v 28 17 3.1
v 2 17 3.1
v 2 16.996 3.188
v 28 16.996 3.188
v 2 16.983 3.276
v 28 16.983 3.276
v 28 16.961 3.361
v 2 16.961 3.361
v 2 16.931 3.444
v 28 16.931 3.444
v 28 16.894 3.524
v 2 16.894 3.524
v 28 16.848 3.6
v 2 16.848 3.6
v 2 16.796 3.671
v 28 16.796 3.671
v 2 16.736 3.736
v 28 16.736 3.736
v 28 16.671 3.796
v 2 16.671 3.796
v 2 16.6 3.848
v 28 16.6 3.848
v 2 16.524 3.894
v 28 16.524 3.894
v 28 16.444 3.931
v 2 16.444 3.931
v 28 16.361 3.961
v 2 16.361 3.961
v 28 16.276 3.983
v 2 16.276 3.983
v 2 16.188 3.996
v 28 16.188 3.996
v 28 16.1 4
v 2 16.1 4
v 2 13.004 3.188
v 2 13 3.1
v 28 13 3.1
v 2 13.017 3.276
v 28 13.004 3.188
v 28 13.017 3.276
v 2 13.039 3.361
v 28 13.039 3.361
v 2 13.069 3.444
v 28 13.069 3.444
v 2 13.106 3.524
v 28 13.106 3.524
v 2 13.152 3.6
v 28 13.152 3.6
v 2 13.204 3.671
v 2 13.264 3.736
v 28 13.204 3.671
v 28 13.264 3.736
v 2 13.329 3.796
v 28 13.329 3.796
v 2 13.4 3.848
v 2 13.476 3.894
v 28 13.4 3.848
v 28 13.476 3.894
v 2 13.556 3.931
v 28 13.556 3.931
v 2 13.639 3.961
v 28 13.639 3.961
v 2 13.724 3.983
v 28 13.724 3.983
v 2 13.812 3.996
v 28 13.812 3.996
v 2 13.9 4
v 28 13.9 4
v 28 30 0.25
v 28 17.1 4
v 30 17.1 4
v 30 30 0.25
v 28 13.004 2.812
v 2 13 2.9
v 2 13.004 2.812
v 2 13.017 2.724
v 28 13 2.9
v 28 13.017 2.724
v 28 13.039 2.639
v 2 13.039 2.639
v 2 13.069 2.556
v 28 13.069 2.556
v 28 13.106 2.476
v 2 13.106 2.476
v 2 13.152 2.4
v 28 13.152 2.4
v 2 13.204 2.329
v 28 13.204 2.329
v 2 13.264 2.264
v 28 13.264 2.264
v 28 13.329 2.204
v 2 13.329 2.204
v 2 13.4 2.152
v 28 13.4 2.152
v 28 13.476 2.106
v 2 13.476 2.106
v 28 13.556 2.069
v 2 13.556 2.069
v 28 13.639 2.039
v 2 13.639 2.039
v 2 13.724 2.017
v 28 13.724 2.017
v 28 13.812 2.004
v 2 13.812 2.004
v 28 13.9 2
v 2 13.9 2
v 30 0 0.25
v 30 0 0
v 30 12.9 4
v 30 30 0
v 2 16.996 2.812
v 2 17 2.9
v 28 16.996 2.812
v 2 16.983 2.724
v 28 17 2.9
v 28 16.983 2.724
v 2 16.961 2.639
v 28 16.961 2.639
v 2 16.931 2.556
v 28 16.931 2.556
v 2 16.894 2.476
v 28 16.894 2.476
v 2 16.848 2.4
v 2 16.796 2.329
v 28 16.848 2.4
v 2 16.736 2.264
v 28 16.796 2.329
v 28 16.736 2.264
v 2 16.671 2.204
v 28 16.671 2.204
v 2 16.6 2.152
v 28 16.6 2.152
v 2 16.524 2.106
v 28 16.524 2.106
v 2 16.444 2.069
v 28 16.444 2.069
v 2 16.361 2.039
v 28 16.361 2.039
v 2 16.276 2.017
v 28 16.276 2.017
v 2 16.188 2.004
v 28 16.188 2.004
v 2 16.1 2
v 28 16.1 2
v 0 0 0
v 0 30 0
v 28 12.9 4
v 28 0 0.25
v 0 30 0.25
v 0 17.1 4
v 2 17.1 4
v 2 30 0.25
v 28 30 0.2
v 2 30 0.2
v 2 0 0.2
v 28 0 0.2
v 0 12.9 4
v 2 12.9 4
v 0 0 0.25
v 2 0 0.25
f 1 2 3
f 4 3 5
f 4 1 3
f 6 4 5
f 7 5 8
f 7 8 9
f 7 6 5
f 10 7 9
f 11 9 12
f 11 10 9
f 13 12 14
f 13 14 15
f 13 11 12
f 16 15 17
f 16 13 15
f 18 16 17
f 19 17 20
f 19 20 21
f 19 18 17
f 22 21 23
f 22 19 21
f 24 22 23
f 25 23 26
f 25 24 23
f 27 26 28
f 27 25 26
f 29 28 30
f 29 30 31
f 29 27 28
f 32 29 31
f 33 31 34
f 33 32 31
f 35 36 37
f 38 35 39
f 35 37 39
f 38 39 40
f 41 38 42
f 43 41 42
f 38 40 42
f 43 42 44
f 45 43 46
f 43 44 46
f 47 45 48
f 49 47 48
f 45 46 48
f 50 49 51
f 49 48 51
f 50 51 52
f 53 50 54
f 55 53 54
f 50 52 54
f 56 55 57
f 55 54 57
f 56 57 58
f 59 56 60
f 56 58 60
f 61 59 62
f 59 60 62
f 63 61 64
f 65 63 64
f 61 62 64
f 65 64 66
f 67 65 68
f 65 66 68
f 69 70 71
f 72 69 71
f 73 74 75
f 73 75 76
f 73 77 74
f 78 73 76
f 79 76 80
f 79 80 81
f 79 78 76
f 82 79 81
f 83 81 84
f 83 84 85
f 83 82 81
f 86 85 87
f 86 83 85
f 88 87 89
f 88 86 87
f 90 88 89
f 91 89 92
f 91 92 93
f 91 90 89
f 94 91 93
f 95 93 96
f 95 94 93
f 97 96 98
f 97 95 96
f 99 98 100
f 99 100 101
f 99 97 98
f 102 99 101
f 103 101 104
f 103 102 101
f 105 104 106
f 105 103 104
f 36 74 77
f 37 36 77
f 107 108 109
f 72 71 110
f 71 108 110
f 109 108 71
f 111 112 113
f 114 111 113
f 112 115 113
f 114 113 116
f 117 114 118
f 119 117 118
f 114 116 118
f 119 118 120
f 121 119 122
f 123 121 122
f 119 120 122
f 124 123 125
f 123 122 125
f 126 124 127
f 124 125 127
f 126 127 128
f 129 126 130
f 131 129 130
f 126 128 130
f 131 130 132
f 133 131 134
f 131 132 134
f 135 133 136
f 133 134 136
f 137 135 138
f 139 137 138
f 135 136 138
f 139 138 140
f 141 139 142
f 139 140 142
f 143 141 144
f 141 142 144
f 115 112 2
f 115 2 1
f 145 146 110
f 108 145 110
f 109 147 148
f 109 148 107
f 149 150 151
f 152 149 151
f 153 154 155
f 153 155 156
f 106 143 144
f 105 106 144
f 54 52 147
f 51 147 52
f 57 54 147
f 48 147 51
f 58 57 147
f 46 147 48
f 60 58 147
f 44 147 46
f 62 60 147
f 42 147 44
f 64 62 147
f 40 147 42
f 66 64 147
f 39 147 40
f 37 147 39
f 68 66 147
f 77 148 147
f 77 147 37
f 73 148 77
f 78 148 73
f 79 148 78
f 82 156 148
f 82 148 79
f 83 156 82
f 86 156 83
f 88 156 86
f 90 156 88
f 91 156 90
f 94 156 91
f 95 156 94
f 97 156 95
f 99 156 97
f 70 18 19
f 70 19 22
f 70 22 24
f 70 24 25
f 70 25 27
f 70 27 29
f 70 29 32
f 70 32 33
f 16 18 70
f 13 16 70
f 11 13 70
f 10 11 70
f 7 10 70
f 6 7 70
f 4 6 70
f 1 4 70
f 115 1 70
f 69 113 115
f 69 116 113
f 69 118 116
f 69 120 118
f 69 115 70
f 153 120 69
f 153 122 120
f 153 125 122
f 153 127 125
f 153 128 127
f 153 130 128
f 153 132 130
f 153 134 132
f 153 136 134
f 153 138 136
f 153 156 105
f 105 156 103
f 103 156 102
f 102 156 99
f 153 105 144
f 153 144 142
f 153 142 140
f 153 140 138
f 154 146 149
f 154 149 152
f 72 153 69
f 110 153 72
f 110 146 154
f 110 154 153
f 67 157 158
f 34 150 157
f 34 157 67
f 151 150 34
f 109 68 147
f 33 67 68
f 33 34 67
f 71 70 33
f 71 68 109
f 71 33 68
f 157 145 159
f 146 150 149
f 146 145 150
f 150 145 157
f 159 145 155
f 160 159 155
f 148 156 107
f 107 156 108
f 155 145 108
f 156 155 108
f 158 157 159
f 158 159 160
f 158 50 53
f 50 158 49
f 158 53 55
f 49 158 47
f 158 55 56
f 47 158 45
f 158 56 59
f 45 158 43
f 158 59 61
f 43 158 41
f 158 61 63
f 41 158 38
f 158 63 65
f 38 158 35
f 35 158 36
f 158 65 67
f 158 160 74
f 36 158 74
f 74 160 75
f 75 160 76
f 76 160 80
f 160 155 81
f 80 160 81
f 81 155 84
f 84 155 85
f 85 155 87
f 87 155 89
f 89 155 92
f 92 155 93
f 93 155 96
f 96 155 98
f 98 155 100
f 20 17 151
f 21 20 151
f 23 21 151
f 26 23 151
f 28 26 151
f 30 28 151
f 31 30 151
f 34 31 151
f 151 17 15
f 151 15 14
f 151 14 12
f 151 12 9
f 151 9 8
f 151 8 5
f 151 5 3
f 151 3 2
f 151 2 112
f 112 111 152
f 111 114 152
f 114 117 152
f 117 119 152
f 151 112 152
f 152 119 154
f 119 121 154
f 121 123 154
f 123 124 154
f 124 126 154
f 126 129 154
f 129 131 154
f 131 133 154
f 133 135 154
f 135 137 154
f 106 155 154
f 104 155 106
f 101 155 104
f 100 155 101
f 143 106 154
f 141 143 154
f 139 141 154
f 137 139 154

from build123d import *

# Parameters (mm, degrees)
BOX001_W        = 2
BOX001_H        = 30
BOX001_DEPTH    = 4
BOX002_W        = 2
BOX002_H        = 30
BOX002_DEPTH    = 4
BOX003_W        = 26
BOX003_H        = 4
BOX003_DEPTH    = 2
FILLET_R        = 0.9
BOX_W           = 30
BOX_H           = 30
BOX_DEPTH       = 0.2
CHAMFER_1_SIZE2 = 3.75
CHAMFER_1_SIZE  = 12.9
CHAMFER_2_SIZE2 = 3.75
CHAMFER_2_SIZE  = 12.9
CHAMFER_3_SIZE2 = 12.9
CHAMFER_3_SIZE  = 3.75
CHAMFER_4_SIZE2 = 12.9
CHAMFER_4_SIZE  = 3.75


with BuildPart() as box001:
    # Box001 → Box001 (new body)
    with BuildSketch(Plane.XY):
        with Locations((1, 15)):
            Rectangle(BOX001_W, BOX001_H)
    extrude(amount=BOX001_DEPTH)


with BuildPart() as box002:
    # Box002 → Box002 (new body)
    with BuildSketch(Plane(origin=(28, 0, 0), x_dir=(1, 0, 0), z_dir=(0, 0, 1))):
        with Locations((1, 15)):
            Rectangle(BOX002_W, BOX002_H)
    extrude(amount=BOX002_DEPTH)


with BuildPart() as fillet_body:
    # Box003 → Box003 (new body)
    with BuildSketch(Plane(origin=(2, 13, 2), x_dir=(1, 0, 0), z_dir=(0, 0, 1))):
        with Locations((13, 2)):
            Rectangle(BOX003_W, BOX003_H)
    extrude(amount=BOX003_DEPTH)

    # Fillet
    fillet_edges = [fillet_body.edges().sort_by_distance(p)[0] for p in [
        (15, 13, 2),
        (15, 13, 4),
        (15, 17, 2),
        (15, 17, 4),
    ]]
    fillet(fillet_edges, radius=FILLET_R)


with BuildPart() as strapassembly:
    # Box → Box (new body)
    with BuildSketch(Plane.XY):
        with Locations((15, 15)):
            Rectangle(BOX_W, BOX_H)
    extrude(amount=BOX_DEPTH)

    # Fusion: union Box001, Box002, Fillet body
    add(box001.part)
    add(box002.part)
    add(fillet_body.part)

    # Chamfer 1
    chamfer_1_edges = [strapassembly.edges().sort_by_distance(p)[0] for p in [
        (29, 30, 4),
    ]]
    chamfer_1_side = strapassembly.faces().sort_by_distance((29, 15, 4))[0]
    chamfer(chamfer_1_edges, length=CHAMFER_1_SIZE, length2=CHAMFER_1_SIZE2, reference=chamfer_1_side)

    # Chamfer 2
    chamfer_2_edges = [strapassembly.edges().sort_by_distance(p)[0] for p in [
        (1, 30, 4),
    ]]
    chamfer_2_side = strapassembly.faces().sort_by_distance((1, 15, 4))[0]
    chamfer(chamfer_2_edges, length=CHAMFER_2_SIZE, length2=CHAMFER_2_SIZE2, reference=chamfer_2_side)

    # Chamfer 3
    chamfer_3_edges = [strapassembly.edges().sort_by_distance(p)[0] for p in [
        (29, 0, 4),
    ]]
    chamfer_3_side = strapassembly.faces().sort_by_distance((29, 0, 2.1))[0]
    chamfer(chamfer_3_edges, length=CHAMFER_3_SIZE, length2=CHAMFER_3_SIZE2, reference=chamfer_3_side)

    # Chamfer 4
    chamfer_4_edges = [strapassembly.edges().sort_by_distance(p)[0] for p in [
        (1, 0, 4),
    ]]
    chamfer_4_side = strapassembly.faces().sort_by_distance((1, 0, 2.1))[0]
    chamfer(chamfer_4_edges, length=CHAMFER_4_SIZE, length2=CHAMFER_4_SIZE2, reference=chamfer_4_side)


solid = strapassembly.part
